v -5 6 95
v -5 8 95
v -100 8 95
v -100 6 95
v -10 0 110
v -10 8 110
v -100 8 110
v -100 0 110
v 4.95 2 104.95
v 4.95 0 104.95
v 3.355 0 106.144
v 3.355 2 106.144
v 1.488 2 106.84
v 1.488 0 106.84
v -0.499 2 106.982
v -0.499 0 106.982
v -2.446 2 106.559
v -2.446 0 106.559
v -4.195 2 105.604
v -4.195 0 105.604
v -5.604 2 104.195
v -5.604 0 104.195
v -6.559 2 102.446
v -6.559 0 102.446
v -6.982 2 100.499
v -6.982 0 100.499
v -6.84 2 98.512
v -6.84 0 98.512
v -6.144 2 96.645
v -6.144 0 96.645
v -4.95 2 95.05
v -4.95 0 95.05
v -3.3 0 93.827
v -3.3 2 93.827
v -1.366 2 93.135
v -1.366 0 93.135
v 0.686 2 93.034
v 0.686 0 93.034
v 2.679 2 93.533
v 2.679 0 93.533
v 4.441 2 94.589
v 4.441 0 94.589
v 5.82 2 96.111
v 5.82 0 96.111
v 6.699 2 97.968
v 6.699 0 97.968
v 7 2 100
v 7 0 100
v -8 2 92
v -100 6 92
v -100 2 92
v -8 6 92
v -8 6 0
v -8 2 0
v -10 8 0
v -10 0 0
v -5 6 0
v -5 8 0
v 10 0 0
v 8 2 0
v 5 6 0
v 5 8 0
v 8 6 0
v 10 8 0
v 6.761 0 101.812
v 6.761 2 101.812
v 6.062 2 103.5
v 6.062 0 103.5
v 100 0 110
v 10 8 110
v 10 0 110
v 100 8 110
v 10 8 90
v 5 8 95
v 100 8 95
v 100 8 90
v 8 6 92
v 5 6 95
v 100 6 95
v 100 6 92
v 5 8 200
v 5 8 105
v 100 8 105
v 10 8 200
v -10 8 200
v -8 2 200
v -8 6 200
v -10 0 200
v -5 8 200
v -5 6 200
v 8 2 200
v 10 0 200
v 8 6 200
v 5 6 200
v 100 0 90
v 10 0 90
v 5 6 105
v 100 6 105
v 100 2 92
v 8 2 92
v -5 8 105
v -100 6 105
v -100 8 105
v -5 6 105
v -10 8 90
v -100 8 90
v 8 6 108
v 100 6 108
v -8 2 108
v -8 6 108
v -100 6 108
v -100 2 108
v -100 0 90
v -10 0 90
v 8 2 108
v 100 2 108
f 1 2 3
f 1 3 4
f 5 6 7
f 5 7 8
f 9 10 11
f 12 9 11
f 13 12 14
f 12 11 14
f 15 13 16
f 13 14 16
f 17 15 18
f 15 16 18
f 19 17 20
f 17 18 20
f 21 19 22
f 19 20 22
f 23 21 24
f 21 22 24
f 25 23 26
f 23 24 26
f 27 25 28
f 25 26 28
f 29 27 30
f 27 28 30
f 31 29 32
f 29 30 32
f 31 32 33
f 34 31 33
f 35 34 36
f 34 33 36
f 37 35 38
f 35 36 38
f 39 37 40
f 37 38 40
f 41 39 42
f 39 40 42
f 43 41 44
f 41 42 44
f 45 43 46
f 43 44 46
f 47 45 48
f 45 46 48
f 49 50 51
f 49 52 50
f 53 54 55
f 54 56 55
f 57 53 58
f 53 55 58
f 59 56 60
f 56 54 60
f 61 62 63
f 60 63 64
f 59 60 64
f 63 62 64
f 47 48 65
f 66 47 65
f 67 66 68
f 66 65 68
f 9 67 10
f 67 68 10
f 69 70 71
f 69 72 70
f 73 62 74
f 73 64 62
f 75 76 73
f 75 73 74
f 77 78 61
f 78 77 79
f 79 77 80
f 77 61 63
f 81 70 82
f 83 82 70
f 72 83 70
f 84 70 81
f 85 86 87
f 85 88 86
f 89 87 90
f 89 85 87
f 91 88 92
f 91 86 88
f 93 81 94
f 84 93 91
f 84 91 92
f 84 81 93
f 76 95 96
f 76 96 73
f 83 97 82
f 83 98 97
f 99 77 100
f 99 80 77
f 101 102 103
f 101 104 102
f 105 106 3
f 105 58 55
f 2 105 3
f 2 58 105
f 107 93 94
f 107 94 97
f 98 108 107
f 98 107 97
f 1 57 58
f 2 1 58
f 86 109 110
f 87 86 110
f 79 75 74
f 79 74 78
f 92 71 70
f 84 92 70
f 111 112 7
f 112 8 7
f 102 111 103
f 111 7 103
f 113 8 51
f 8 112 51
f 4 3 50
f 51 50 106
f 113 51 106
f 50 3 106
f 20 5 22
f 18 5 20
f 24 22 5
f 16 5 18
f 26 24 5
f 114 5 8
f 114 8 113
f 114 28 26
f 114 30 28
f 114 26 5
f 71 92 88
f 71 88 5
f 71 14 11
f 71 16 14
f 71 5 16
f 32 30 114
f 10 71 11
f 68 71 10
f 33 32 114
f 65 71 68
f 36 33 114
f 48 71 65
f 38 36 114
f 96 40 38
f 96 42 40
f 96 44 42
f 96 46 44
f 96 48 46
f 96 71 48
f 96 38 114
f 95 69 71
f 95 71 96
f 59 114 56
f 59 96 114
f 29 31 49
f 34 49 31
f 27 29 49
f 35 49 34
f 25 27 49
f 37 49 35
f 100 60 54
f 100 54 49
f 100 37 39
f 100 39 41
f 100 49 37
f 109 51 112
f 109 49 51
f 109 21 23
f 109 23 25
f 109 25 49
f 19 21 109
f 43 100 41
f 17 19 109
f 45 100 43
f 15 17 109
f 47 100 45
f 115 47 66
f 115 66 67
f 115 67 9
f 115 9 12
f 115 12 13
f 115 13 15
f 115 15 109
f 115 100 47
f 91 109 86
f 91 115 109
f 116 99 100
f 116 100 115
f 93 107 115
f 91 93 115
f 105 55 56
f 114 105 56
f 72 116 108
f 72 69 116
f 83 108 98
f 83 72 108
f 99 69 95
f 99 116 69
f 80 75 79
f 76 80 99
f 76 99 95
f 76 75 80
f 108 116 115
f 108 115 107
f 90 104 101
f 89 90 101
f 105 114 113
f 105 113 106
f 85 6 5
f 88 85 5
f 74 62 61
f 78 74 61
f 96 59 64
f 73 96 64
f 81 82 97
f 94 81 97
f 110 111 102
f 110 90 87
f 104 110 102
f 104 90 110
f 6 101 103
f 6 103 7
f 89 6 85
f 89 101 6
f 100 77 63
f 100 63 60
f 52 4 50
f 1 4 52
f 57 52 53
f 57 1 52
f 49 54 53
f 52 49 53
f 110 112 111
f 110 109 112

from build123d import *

# Parameters (mm, degrees)
EXTRUDE_1_DEPTH     = 200
EXTRUDE_2_DEPTH     = 100
CUT_EXTRUDE_1_DEPTH = 200
CUT_EXTRUDE_2_DEPTH = 200
CUT_EXTRUDE_3_DEPTH = 15


with BuildPart() as part:
    # 草图1 → 凸台-拉伸1 (new body)
    with BuildSketch(Plane.XY):
        Polygon((0, 0), (10, 0), (10, 8), (5, 8), (5, 6), (8, 6), (8, 2), (0, 2), (-8, 2), (-8, 6), (-5, 6), (-5, 8), (-10, 8), (-10, 0), align=None)
    extrude(amount=EXTRUDE_1_DEPTH)

    # 草图2 → 凸台-拉伸2 (add, symmetric)
    with BuildSketch(Plane(origin=(0, 0, 0), x_dir=(0, 0, -1), z_dir=(1, 0, 0))):
        Polygon((-100, 0), (-90, 0), (-90, 8), (-95, 8), (-95, 6), (-92, 6), (-92, 2), (-100, 2), (-108, 2), (-108, 6), (-105, 6), (-105, 8), (-110, 8), (-110, 0), align=None)
    extrude(amount=EXTRUDE_2_DEPTH, both=True)

    # 草图3 → 切除-拉伸1 (cut)
    with BuildSketch(Plane(origin=(100, 0, 0), x_dir=(0, 0, -1), z_dir=(1, 0, 0))):
        Polygon((-108, 6), (-105, 6), (-105, 8), (-95, 8), (-95, 6), (-92, 6), (-92, 2), (-108, 2), align=None)
    extrude(amount=-CUT_EXTRUDE_1_DEPTH, mode=Mode.SUBTRACT)

    # 草图4 → 切除-拉伸2 (cut)
    with BuildSketch(Plane.XY.offset(200)):
        Polygon((5, 6), (8, 6), (8, 2), (-8, 2), (-8, 6), (-5, 6), (-5, 8), (5, 8), align=None)
    extrude(amount=-CUT_EXTRUDE_2_DEPTH, mode=Mode.SUBTRACT)

    # 草图5 → 切除-拉伸3 (cut)
    with BuildSketch(Plane.XZ):
        with BuildLine():
            ThreePointArc((4.949747468, 104.949747468), (-4.949747468, 104.949747468), (-4.949747468, 95.050252532))
            Line((-4.949747468, 95.050252532), (4.949747468, 104.949747468))
        make_face()
        with BuildLine():
            Line((4.949747468, 104.949747468), (-4.949747468, 95.050252532))
            ThreePointArc((-4.949747468, 95.050252532), (2.678784027, 93.532843272), (7, 100))
            ThreePointArc((7, 100), (6.467156728, 102.678784027), (4.949747468, 104.949747468))
        make_face()
    extrude(amount=-CUT_EXTRUDE_3_DEPTH, mode=Mode.SUBTRACT)


solid = part.part
